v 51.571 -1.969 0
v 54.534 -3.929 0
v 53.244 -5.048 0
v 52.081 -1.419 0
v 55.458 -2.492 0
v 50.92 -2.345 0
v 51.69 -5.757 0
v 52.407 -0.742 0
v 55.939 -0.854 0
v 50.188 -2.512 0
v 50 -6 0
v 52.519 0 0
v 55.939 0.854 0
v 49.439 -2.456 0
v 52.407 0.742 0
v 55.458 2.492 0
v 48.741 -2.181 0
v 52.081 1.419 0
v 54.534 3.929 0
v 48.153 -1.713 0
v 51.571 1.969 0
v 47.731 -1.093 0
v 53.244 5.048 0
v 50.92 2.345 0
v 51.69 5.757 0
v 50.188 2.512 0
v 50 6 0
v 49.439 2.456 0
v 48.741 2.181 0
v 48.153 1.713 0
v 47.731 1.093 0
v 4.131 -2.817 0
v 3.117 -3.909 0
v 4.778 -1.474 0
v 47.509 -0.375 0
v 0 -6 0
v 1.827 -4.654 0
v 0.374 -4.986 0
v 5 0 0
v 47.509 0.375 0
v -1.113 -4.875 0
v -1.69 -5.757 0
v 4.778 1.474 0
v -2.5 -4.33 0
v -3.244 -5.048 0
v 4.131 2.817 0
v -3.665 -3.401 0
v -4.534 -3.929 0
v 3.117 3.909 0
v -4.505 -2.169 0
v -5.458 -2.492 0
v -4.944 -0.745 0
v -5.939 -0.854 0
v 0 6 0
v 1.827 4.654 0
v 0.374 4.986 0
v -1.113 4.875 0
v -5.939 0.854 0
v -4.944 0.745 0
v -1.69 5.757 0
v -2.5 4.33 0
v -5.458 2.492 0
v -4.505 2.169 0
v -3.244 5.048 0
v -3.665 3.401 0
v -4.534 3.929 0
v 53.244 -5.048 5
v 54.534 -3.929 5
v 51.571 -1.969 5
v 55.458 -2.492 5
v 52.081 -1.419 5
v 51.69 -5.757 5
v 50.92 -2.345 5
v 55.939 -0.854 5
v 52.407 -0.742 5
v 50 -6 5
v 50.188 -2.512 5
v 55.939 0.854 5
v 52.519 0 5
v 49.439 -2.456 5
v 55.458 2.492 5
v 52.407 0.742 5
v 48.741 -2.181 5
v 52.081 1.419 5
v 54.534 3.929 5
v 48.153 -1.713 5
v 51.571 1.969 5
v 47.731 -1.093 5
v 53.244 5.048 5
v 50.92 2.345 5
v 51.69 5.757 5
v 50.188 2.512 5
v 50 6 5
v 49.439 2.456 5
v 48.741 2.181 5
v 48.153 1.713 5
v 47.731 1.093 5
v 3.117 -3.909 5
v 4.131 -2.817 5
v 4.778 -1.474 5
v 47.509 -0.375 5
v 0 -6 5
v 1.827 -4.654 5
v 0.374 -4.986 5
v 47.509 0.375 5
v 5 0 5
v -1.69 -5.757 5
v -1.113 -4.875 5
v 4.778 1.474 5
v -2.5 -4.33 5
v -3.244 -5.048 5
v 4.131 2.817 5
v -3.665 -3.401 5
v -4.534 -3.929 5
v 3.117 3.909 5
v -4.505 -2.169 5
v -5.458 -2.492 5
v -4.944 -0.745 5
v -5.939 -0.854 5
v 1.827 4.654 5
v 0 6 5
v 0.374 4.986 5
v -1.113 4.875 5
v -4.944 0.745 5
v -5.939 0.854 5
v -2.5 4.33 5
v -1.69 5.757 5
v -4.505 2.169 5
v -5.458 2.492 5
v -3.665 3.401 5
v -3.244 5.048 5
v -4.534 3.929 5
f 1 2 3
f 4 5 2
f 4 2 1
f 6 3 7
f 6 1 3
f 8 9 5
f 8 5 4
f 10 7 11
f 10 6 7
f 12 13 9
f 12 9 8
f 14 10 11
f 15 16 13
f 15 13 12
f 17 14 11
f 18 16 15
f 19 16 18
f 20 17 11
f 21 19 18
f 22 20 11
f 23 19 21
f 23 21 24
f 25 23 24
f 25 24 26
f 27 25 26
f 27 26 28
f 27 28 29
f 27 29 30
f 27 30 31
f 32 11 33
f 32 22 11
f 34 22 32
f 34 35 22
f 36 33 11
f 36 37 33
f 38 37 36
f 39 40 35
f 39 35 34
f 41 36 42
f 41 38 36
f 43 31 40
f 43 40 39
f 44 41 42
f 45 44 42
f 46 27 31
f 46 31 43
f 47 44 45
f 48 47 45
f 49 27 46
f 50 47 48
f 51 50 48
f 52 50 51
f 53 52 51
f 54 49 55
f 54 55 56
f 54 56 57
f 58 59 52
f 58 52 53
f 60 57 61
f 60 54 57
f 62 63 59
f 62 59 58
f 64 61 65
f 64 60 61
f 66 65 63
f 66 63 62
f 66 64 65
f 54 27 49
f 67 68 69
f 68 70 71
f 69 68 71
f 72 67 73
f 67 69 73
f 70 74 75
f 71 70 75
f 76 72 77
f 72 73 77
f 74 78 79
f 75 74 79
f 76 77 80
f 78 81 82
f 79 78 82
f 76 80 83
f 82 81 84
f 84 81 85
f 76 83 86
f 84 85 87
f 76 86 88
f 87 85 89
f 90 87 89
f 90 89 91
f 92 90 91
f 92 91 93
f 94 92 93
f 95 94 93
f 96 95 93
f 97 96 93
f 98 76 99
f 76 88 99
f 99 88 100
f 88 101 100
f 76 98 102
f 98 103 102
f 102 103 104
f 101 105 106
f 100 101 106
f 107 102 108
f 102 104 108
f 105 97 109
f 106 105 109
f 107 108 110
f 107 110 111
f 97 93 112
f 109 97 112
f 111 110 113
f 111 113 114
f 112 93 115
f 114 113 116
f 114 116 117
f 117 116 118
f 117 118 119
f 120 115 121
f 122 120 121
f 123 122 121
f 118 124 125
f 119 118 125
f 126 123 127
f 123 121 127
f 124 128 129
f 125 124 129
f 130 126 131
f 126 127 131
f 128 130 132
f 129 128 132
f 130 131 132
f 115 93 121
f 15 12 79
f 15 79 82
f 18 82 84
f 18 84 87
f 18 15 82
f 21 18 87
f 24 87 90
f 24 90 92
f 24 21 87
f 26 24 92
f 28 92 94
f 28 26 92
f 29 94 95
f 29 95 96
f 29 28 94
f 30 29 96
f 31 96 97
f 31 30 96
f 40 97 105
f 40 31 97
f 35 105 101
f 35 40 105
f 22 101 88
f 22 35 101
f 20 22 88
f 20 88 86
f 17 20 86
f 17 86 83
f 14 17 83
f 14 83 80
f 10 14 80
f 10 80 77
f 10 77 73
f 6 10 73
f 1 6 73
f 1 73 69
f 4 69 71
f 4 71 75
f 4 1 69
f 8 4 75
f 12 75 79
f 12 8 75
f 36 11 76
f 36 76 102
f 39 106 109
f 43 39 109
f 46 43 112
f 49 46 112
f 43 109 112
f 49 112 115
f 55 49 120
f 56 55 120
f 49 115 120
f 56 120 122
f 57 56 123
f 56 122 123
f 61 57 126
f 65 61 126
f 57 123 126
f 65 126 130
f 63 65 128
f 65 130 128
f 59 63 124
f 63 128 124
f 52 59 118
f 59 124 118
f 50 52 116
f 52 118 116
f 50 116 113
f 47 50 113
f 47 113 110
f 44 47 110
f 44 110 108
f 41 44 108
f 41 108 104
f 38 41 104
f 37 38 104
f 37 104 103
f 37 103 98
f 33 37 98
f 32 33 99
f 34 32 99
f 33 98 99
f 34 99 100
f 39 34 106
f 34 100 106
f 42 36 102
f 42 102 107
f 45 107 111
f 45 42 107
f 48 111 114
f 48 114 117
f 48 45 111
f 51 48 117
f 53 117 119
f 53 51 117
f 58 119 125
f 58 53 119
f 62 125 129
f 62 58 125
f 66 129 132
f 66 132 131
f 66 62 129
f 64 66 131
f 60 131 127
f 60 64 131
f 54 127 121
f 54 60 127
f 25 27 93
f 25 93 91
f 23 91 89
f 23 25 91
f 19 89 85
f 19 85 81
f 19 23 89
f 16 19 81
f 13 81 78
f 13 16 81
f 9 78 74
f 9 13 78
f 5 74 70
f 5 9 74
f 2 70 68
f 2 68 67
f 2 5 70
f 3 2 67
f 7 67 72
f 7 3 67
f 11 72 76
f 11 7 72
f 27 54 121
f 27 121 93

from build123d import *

# Parameters (mm, degrees)
SKETCH_1_R          = 2.518951354
EXTRUDE_1_DEPTH     = 5
SKETCH_2_R          = 5
CUT_EXTRUDE_1_DEPTH = 5


with BuildPart() as part:
    # 草图1 → 凸台-拉伸1 (new body)
    with BuildSketch(Plane.XY):
        with BuildLine():
            Line((0, 6), (50, 6))
            ThreePointArc((50, 6), (56, 0), (50, -6))
            Line((50, -6), (0, -6))
            ThreePointArc((0, -6), (-6, 0), (0, 6))
        make_face()
        with Locations((50, 0)):
            Circle(SKETCH_1_R, mode=Mode.SUBTRACT)
    extrude(amount=EXTRUDE_1_DEPTH)

    # 草图2 → 切除-拉伸1 (cut)
    with BuildSketch(Plane.XY.offset(5)):
        Circle(SKETCH_2_R)
    extrude(amount=-CUT_EXTRUDE_1_DEPTH, mode=Mode.SUBTRACT)


solid = part.part
